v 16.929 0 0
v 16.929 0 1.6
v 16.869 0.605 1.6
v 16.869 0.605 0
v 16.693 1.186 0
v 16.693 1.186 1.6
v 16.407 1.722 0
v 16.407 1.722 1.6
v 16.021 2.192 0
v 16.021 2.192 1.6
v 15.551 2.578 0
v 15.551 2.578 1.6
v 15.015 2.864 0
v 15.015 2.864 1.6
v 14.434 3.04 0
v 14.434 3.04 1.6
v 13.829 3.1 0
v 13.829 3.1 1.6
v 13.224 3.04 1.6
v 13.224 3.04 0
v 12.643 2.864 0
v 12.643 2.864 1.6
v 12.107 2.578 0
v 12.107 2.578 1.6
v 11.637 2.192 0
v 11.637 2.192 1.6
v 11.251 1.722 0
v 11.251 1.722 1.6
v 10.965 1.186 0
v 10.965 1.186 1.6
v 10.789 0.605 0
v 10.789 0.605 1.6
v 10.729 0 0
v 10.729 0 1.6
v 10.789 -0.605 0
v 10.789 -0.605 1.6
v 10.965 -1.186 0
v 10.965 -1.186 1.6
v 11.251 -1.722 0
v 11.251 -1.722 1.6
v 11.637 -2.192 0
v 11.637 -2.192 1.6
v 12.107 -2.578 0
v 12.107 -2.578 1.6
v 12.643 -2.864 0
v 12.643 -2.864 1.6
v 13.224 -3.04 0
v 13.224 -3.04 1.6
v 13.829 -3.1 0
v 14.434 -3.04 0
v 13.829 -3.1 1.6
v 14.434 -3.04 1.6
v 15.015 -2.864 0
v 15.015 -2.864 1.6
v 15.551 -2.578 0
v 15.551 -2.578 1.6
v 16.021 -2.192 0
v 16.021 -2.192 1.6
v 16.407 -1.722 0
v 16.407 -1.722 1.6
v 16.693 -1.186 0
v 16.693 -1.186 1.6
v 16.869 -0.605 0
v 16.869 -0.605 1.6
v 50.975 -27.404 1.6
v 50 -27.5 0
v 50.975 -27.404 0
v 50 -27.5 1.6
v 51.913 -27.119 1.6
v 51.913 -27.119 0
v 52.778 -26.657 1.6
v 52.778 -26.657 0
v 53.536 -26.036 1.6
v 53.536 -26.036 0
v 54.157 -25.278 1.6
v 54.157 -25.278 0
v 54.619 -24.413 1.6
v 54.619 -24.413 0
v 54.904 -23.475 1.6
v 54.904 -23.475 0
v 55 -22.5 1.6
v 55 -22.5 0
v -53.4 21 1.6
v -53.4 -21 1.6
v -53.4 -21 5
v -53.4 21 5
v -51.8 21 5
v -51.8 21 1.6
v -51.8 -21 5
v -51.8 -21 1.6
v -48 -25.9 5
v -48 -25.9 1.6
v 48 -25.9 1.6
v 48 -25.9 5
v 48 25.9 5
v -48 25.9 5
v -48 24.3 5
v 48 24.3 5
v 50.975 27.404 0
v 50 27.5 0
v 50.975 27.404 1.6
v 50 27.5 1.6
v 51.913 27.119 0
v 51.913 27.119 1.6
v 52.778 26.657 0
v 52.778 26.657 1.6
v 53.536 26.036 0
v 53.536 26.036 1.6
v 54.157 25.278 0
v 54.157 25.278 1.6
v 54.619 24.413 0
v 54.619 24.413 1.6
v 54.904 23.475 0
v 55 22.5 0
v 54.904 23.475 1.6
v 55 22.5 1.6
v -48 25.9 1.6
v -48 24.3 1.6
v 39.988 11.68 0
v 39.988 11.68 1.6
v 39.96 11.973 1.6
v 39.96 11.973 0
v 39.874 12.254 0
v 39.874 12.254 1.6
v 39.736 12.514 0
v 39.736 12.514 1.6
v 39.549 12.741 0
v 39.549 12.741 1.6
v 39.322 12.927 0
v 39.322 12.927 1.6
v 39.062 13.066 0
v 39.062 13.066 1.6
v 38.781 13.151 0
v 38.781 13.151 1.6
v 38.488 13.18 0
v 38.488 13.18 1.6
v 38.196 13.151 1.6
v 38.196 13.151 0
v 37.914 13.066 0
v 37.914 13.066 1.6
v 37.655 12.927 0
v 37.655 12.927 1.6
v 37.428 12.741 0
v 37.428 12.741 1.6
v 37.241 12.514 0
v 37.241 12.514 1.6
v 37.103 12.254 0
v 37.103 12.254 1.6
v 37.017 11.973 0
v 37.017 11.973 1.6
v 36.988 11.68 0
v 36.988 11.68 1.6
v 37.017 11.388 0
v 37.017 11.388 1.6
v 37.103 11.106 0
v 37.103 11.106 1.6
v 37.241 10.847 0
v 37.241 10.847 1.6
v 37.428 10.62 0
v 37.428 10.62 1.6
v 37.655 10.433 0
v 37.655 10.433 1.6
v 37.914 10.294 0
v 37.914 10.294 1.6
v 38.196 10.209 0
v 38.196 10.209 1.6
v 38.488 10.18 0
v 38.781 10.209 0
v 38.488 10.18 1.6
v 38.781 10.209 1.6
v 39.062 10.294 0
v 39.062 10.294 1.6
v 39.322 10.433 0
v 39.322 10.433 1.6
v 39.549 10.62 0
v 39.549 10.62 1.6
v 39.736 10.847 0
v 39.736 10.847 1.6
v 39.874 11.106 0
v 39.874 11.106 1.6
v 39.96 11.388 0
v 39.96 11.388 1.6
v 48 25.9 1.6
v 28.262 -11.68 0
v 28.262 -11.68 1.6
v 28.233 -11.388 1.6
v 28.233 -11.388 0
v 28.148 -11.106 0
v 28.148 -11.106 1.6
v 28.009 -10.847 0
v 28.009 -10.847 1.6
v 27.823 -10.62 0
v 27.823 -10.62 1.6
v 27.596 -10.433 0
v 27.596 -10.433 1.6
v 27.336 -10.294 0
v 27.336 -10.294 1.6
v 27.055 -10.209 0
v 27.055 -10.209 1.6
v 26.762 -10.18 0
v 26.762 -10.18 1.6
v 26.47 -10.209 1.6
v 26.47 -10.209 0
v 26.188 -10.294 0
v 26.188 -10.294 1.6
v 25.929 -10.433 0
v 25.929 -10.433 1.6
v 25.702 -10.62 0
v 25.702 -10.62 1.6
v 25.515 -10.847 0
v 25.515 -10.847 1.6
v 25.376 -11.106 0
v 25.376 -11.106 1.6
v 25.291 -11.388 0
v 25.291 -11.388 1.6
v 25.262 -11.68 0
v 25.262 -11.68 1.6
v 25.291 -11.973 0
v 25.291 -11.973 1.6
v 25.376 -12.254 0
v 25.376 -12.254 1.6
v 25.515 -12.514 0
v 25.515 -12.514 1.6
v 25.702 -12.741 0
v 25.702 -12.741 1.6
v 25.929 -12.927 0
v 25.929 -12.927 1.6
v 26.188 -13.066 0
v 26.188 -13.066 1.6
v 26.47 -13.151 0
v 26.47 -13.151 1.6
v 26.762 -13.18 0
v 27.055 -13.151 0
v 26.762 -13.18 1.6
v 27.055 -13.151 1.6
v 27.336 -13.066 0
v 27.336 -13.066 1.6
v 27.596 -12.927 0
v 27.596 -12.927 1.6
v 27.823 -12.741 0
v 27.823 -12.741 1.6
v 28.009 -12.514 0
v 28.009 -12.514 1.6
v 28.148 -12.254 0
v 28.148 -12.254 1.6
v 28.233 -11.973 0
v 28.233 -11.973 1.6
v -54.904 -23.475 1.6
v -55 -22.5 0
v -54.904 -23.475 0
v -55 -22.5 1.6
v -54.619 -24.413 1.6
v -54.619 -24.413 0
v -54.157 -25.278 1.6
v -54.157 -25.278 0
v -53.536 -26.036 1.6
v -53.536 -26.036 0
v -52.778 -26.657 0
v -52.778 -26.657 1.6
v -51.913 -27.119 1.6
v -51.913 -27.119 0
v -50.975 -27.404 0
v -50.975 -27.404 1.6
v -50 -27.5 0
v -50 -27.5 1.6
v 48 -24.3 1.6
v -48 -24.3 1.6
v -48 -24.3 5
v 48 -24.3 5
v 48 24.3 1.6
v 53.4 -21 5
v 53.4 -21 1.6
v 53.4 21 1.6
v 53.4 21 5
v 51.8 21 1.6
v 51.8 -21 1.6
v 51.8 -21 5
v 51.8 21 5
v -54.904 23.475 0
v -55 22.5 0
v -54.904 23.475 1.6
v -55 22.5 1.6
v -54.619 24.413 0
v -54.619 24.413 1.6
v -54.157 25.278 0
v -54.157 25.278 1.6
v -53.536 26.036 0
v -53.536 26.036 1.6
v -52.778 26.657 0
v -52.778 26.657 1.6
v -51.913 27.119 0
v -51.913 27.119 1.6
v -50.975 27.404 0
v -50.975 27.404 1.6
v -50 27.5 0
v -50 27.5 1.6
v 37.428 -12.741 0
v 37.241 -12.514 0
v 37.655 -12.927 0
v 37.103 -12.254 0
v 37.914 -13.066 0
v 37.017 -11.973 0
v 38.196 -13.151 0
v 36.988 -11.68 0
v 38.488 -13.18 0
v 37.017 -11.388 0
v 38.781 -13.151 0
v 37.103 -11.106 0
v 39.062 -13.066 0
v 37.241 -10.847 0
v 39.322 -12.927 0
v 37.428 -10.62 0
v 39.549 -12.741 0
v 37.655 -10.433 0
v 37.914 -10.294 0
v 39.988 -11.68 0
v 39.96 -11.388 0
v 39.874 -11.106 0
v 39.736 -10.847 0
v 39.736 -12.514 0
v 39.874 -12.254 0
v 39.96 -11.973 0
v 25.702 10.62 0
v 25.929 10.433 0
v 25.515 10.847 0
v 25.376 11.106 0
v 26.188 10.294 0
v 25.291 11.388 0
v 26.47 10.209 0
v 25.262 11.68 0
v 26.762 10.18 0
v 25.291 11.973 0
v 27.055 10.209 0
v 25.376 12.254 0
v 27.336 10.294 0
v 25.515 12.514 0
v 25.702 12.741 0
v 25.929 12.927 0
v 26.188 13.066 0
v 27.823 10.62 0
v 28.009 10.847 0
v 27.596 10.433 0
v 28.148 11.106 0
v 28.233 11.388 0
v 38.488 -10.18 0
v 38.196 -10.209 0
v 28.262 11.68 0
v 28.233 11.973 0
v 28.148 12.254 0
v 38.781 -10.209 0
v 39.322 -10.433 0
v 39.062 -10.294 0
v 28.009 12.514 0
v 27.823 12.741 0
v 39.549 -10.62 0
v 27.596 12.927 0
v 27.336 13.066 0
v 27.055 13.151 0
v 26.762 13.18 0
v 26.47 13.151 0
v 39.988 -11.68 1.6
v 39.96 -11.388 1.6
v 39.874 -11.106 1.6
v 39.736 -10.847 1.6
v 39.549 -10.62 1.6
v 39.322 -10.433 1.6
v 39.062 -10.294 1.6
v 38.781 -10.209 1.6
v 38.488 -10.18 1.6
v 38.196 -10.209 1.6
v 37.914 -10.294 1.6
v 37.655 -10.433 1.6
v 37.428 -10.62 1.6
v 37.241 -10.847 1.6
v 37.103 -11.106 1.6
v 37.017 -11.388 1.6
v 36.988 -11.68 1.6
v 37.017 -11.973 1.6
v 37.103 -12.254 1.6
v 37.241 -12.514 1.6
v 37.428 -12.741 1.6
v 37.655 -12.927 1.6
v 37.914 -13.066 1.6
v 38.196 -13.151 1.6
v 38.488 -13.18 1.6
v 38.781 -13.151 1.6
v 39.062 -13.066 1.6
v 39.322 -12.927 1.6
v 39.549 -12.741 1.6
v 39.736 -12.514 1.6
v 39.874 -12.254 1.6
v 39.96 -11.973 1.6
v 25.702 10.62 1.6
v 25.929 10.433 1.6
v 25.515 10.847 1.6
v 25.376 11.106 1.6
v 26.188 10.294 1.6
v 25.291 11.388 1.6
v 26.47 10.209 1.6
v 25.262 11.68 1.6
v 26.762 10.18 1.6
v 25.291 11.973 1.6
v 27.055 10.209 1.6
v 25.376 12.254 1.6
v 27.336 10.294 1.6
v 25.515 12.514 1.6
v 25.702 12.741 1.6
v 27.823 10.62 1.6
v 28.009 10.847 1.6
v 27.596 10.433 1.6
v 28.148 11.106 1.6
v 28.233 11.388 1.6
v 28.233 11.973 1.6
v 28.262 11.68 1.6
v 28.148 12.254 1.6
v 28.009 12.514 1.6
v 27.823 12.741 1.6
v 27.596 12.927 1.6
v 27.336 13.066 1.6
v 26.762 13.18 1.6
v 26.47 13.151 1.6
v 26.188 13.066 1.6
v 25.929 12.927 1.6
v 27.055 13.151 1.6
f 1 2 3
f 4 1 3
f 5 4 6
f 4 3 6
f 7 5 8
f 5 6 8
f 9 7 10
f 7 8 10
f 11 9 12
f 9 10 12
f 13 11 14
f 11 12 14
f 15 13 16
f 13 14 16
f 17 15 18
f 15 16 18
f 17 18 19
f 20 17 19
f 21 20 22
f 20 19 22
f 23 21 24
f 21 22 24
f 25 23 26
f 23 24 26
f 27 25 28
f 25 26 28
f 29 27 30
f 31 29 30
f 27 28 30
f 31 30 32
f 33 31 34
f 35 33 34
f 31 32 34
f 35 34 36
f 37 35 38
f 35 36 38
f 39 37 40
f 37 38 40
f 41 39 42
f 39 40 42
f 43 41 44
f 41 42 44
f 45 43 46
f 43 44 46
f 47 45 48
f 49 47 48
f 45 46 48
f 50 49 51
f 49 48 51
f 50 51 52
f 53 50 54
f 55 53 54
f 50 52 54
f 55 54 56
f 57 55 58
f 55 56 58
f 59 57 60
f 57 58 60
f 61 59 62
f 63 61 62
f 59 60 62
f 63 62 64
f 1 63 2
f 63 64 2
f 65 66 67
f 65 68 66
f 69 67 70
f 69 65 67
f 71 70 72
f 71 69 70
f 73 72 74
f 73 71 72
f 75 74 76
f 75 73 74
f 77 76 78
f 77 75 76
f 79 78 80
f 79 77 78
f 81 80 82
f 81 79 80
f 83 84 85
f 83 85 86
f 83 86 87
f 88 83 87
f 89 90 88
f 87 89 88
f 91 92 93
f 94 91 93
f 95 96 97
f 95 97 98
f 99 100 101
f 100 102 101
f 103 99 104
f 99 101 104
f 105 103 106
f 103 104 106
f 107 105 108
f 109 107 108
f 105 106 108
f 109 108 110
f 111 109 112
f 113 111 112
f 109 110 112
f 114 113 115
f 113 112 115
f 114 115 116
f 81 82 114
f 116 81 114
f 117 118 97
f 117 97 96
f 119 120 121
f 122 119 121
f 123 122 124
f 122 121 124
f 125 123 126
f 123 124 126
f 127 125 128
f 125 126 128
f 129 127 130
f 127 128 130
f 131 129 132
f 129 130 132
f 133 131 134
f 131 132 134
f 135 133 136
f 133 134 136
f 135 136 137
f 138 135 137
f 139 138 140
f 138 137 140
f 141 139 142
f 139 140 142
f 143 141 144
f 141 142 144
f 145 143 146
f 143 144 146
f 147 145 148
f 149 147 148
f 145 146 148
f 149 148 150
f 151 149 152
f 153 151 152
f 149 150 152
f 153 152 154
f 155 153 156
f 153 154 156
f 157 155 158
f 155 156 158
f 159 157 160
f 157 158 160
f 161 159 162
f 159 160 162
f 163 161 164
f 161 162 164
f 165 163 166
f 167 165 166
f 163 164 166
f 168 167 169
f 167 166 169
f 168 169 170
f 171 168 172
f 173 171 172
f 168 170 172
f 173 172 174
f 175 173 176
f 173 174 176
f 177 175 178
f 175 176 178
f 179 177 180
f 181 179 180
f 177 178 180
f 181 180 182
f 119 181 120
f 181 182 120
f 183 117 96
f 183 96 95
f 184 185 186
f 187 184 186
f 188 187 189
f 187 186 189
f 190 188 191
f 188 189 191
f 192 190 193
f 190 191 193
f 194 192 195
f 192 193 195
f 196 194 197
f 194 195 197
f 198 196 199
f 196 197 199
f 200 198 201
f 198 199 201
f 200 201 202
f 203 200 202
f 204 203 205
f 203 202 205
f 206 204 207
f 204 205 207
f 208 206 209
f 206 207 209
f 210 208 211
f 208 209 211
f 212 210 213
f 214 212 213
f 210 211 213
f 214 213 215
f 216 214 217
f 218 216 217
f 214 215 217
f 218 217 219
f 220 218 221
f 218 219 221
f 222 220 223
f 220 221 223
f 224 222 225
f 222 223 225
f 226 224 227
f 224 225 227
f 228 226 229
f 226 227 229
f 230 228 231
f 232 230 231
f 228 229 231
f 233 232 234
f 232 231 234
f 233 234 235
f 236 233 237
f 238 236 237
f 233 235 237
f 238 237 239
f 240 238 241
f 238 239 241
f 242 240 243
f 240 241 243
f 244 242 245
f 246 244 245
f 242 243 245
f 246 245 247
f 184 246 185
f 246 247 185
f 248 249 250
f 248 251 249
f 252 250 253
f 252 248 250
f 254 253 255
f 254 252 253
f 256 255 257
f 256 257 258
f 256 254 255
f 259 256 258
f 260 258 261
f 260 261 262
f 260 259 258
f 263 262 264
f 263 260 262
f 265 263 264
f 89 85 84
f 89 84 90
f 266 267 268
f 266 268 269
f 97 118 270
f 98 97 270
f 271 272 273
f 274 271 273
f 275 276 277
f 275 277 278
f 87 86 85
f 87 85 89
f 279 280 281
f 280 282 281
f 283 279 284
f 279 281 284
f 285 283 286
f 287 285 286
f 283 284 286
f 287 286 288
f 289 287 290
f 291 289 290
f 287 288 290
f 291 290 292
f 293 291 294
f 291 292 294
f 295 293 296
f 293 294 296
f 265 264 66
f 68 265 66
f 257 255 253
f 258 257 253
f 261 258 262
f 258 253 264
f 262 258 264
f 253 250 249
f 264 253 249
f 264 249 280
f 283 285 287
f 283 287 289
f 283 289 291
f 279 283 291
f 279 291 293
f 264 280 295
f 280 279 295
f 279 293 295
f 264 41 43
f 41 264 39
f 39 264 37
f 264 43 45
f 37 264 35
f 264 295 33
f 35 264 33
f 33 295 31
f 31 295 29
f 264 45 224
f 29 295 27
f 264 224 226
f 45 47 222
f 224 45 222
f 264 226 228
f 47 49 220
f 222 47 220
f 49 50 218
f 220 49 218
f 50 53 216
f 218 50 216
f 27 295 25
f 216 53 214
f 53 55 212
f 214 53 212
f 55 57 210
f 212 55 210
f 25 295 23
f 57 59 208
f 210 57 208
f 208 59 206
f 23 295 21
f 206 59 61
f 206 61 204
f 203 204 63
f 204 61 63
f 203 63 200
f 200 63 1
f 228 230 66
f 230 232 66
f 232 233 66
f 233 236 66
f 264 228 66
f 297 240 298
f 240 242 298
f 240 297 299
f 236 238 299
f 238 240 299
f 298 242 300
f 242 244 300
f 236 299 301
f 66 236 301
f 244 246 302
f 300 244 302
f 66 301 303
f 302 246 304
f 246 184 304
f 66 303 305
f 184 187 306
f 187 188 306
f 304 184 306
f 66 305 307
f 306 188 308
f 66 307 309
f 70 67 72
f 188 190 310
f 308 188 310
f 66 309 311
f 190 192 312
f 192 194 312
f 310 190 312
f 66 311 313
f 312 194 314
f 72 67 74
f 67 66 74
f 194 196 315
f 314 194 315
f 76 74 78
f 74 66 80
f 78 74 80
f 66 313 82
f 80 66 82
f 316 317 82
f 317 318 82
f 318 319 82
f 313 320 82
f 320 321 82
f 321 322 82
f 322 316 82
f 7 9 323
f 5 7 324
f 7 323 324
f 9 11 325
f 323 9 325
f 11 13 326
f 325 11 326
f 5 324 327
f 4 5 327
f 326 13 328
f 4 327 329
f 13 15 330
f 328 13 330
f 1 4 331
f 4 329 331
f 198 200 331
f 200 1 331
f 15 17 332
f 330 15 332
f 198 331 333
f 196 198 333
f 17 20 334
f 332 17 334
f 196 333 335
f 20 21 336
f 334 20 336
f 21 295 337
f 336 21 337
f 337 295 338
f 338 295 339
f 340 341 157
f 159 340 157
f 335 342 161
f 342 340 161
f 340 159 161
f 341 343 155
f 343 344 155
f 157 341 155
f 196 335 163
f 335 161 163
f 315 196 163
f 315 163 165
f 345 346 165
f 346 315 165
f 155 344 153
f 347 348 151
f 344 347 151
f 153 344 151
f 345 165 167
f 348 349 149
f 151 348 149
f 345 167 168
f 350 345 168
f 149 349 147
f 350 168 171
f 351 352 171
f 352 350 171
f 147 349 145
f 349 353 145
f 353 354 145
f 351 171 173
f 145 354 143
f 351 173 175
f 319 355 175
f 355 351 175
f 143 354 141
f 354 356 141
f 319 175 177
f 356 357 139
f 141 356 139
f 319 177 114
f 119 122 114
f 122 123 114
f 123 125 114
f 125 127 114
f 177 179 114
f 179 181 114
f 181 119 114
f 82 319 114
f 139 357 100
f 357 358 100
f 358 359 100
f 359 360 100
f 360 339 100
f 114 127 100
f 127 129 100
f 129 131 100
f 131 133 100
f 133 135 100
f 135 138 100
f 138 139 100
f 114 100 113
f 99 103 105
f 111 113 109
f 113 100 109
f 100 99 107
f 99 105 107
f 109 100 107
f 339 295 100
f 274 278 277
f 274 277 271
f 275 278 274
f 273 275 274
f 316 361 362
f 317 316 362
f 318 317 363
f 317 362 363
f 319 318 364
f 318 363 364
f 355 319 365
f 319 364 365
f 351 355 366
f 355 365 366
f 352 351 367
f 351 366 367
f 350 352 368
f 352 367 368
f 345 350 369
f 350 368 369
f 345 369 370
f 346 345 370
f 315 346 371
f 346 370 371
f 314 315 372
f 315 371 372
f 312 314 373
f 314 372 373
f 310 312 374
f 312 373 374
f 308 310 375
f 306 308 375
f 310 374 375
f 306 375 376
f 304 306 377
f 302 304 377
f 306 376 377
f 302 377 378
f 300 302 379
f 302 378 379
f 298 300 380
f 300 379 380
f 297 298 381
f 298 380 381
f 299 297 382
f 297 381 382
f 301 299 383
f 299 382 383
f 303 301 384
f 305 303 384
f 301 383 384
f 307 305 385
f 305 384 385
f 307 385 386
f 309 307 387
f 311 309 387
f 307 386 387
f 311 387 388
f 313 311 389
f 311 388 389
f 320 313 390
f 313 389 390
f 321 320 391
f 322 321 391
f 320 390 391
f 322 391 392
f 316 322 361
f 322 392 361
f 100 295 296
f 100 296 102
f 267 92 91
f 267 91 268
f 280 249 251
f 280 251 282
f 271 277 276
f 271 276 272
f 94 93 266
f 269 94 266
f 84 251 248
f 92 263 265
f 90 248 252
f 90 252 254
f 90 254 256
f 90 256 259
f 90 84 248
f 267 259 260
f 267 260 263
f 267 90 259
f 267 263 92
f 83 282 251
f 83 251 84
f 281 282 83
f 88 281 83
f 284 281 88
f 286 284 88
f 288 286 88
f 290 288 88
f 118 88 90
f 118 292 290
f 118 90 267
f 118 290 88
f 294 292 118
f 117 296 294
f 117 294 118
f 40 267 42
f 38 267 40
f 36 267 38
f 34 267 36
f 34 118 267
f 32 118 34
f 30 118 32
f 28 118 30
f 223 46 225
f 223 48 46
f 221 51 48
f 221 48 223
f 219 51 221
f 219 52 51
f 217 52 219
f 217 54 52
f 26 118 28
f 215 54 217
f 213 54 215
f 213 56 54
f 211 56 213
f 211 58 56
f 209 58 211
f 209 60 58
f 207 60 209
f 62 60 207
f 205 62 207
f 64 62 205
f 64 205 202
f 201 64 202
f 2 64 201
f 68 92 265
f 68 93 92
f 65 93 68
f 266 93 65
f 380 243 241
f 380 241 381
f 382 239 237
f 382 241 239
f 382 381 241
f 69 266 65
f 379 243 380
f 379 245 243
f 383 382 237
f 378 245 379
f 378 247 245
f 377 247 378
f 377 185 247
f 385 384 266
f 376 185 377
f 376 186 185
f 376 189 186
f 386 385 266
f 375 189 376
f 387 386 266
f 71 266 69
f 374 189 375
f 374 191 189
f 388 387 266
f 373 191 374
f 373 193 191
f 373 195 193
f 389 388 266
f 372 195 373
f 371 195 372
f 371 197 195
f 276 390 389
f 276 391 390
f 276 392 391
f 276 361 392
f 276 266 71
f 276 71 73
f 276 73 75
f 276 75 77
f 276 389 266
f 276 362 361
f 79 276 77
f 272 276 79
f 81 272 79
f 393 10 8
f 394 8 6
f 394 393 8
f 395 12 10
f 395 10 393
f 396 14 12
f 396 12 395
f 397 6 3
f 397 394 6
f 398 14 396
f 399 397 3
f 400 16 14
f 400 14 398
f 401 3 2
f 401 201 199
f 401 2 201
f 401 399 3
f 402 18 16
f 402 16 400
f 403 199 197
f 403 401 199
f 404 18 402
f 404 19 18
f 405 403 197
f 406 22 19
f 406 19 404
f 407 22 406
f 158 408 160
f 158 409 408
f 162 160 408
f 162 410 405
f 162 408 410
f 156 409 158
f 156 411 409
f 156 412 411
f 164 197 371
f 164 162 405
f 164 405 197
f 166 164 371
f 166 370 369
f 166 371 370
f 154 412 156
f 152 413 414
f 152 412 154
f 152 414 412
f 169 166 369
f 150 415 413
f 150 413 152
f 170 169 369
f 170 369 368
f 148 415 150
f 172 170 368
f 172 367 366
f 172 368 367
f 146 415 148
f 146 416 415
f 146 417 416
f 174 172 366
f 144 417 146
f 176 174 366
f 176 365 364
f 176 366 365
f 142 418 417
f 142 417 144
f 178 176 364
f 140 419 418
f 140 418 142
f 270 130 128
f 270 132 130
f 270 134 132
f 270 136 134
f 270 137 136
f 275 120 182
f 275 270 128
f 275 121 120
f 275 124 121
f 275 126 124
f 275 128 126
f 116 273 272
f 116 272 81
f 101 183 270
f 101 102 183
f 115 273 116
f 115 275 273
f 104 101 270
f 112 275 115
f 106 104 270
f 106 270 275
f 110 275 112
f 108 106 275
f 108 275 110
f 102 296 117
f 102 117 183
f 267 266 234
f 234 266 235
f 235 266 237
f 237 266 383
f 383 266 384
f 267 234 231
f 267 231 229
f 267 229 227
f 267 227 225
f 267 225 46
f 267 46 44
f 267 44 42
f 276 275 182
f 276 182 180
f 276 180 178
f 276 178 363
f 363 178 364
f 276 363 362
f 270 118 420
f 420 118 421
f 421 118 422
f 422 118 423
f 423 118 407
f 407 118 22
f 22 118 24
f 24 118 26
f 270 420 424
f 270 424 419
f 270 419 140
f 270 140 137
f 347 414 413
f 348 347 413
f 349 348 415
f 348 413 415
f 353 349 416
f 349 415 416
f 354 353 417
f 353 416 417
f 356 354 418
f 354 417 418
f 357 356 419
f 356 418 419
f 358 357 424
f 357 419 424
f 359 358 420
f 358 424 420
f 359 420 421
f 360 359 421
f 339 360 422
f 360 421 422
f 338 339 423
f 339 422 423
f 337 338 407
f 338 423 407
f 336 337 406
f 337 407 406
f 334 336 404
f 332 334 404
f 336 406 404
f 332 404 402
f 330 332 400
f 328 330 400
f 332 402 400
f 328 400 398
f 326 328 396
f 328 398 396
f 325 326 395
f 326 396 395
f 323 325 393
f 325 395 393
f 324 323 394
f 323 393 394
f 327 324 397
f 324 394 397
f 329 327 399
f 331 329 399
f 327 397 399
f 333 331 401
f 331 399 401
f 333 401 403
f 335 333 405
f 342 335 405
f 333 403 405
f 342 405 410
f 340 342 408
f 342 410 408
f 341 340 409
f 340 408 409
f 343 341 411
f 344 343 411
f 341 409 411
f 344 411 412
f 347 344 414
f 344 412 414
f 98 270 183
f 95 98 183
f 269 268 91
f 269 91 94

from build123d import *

# Parameters (mm, degrees)
F0_W     = 110
F0_H     = 55
F1_DEPTH = 1.6
F2_R     = 1.5
F2_R_2   = 3.1
F3_DEPTH = 1.6
F2_W     = 96
F2_H     = 1.6
F2_W_2   = 1.6
F2_H_2   = 42
F4_DEPTH = 3.4
F5_R     = 5


with BuildPart() as f1:
    # F0 (on Top) → F1 (new body)
    with BuildSketch(Plane.XY):
        Rectangle(F0_W, F0_H)
    extrude(amount=F1_DEPTH)

    # F2 (on face) → F3 (cut, through all)
    with BuildSketch(Plane.XY.offset(1.6)):
        with Locations((26.762206, 11.680291)):
            Circle(F2_R)
        with Locations((38.488474, 11.680291)):
            Circle(F2_R)
        with Locations((26.762206, -11.680291)):
            Circle(F2_R)
        with Locations((38.488474, -11.680291)):
            Circle(F2_R)
        with Locations((13.829022, 0)):
            Circle(F2_R_2)
    extrude(amount=-F3_DEPTH, mode=Mode.SUBTRACT)

    # F2 (on face) → F4 (join)
    with BuildSketch(Plane.XY.offset(1.6)):
        with Locations((0, 25.1)):
            Rectangle(F2_W, F2_H)
        with Locations((-52.6, 0)):
            Rectangle(F2_W_2, F2_H_2)
        with Locations((0, -25.1)):
            Rectangle(F2_W, F2_H)
        with Locations((52.6, 0)):
            Rectangle(F2_W_2, F2_H_2)
    extrude(amount=F4_DEPTH)

    # F5
    f5_edges = [f1.edges().sort_by_distance(p)[0] for p in [
        (55, -27.5, 0.8),
        (-55, -27.5, 0.8),
        (55, 27.5, 0.8),
        (-55, 27.5, 0.8),
    ]]
    fillet(f5_edges, radius=F5_R)


solid = f1.part
